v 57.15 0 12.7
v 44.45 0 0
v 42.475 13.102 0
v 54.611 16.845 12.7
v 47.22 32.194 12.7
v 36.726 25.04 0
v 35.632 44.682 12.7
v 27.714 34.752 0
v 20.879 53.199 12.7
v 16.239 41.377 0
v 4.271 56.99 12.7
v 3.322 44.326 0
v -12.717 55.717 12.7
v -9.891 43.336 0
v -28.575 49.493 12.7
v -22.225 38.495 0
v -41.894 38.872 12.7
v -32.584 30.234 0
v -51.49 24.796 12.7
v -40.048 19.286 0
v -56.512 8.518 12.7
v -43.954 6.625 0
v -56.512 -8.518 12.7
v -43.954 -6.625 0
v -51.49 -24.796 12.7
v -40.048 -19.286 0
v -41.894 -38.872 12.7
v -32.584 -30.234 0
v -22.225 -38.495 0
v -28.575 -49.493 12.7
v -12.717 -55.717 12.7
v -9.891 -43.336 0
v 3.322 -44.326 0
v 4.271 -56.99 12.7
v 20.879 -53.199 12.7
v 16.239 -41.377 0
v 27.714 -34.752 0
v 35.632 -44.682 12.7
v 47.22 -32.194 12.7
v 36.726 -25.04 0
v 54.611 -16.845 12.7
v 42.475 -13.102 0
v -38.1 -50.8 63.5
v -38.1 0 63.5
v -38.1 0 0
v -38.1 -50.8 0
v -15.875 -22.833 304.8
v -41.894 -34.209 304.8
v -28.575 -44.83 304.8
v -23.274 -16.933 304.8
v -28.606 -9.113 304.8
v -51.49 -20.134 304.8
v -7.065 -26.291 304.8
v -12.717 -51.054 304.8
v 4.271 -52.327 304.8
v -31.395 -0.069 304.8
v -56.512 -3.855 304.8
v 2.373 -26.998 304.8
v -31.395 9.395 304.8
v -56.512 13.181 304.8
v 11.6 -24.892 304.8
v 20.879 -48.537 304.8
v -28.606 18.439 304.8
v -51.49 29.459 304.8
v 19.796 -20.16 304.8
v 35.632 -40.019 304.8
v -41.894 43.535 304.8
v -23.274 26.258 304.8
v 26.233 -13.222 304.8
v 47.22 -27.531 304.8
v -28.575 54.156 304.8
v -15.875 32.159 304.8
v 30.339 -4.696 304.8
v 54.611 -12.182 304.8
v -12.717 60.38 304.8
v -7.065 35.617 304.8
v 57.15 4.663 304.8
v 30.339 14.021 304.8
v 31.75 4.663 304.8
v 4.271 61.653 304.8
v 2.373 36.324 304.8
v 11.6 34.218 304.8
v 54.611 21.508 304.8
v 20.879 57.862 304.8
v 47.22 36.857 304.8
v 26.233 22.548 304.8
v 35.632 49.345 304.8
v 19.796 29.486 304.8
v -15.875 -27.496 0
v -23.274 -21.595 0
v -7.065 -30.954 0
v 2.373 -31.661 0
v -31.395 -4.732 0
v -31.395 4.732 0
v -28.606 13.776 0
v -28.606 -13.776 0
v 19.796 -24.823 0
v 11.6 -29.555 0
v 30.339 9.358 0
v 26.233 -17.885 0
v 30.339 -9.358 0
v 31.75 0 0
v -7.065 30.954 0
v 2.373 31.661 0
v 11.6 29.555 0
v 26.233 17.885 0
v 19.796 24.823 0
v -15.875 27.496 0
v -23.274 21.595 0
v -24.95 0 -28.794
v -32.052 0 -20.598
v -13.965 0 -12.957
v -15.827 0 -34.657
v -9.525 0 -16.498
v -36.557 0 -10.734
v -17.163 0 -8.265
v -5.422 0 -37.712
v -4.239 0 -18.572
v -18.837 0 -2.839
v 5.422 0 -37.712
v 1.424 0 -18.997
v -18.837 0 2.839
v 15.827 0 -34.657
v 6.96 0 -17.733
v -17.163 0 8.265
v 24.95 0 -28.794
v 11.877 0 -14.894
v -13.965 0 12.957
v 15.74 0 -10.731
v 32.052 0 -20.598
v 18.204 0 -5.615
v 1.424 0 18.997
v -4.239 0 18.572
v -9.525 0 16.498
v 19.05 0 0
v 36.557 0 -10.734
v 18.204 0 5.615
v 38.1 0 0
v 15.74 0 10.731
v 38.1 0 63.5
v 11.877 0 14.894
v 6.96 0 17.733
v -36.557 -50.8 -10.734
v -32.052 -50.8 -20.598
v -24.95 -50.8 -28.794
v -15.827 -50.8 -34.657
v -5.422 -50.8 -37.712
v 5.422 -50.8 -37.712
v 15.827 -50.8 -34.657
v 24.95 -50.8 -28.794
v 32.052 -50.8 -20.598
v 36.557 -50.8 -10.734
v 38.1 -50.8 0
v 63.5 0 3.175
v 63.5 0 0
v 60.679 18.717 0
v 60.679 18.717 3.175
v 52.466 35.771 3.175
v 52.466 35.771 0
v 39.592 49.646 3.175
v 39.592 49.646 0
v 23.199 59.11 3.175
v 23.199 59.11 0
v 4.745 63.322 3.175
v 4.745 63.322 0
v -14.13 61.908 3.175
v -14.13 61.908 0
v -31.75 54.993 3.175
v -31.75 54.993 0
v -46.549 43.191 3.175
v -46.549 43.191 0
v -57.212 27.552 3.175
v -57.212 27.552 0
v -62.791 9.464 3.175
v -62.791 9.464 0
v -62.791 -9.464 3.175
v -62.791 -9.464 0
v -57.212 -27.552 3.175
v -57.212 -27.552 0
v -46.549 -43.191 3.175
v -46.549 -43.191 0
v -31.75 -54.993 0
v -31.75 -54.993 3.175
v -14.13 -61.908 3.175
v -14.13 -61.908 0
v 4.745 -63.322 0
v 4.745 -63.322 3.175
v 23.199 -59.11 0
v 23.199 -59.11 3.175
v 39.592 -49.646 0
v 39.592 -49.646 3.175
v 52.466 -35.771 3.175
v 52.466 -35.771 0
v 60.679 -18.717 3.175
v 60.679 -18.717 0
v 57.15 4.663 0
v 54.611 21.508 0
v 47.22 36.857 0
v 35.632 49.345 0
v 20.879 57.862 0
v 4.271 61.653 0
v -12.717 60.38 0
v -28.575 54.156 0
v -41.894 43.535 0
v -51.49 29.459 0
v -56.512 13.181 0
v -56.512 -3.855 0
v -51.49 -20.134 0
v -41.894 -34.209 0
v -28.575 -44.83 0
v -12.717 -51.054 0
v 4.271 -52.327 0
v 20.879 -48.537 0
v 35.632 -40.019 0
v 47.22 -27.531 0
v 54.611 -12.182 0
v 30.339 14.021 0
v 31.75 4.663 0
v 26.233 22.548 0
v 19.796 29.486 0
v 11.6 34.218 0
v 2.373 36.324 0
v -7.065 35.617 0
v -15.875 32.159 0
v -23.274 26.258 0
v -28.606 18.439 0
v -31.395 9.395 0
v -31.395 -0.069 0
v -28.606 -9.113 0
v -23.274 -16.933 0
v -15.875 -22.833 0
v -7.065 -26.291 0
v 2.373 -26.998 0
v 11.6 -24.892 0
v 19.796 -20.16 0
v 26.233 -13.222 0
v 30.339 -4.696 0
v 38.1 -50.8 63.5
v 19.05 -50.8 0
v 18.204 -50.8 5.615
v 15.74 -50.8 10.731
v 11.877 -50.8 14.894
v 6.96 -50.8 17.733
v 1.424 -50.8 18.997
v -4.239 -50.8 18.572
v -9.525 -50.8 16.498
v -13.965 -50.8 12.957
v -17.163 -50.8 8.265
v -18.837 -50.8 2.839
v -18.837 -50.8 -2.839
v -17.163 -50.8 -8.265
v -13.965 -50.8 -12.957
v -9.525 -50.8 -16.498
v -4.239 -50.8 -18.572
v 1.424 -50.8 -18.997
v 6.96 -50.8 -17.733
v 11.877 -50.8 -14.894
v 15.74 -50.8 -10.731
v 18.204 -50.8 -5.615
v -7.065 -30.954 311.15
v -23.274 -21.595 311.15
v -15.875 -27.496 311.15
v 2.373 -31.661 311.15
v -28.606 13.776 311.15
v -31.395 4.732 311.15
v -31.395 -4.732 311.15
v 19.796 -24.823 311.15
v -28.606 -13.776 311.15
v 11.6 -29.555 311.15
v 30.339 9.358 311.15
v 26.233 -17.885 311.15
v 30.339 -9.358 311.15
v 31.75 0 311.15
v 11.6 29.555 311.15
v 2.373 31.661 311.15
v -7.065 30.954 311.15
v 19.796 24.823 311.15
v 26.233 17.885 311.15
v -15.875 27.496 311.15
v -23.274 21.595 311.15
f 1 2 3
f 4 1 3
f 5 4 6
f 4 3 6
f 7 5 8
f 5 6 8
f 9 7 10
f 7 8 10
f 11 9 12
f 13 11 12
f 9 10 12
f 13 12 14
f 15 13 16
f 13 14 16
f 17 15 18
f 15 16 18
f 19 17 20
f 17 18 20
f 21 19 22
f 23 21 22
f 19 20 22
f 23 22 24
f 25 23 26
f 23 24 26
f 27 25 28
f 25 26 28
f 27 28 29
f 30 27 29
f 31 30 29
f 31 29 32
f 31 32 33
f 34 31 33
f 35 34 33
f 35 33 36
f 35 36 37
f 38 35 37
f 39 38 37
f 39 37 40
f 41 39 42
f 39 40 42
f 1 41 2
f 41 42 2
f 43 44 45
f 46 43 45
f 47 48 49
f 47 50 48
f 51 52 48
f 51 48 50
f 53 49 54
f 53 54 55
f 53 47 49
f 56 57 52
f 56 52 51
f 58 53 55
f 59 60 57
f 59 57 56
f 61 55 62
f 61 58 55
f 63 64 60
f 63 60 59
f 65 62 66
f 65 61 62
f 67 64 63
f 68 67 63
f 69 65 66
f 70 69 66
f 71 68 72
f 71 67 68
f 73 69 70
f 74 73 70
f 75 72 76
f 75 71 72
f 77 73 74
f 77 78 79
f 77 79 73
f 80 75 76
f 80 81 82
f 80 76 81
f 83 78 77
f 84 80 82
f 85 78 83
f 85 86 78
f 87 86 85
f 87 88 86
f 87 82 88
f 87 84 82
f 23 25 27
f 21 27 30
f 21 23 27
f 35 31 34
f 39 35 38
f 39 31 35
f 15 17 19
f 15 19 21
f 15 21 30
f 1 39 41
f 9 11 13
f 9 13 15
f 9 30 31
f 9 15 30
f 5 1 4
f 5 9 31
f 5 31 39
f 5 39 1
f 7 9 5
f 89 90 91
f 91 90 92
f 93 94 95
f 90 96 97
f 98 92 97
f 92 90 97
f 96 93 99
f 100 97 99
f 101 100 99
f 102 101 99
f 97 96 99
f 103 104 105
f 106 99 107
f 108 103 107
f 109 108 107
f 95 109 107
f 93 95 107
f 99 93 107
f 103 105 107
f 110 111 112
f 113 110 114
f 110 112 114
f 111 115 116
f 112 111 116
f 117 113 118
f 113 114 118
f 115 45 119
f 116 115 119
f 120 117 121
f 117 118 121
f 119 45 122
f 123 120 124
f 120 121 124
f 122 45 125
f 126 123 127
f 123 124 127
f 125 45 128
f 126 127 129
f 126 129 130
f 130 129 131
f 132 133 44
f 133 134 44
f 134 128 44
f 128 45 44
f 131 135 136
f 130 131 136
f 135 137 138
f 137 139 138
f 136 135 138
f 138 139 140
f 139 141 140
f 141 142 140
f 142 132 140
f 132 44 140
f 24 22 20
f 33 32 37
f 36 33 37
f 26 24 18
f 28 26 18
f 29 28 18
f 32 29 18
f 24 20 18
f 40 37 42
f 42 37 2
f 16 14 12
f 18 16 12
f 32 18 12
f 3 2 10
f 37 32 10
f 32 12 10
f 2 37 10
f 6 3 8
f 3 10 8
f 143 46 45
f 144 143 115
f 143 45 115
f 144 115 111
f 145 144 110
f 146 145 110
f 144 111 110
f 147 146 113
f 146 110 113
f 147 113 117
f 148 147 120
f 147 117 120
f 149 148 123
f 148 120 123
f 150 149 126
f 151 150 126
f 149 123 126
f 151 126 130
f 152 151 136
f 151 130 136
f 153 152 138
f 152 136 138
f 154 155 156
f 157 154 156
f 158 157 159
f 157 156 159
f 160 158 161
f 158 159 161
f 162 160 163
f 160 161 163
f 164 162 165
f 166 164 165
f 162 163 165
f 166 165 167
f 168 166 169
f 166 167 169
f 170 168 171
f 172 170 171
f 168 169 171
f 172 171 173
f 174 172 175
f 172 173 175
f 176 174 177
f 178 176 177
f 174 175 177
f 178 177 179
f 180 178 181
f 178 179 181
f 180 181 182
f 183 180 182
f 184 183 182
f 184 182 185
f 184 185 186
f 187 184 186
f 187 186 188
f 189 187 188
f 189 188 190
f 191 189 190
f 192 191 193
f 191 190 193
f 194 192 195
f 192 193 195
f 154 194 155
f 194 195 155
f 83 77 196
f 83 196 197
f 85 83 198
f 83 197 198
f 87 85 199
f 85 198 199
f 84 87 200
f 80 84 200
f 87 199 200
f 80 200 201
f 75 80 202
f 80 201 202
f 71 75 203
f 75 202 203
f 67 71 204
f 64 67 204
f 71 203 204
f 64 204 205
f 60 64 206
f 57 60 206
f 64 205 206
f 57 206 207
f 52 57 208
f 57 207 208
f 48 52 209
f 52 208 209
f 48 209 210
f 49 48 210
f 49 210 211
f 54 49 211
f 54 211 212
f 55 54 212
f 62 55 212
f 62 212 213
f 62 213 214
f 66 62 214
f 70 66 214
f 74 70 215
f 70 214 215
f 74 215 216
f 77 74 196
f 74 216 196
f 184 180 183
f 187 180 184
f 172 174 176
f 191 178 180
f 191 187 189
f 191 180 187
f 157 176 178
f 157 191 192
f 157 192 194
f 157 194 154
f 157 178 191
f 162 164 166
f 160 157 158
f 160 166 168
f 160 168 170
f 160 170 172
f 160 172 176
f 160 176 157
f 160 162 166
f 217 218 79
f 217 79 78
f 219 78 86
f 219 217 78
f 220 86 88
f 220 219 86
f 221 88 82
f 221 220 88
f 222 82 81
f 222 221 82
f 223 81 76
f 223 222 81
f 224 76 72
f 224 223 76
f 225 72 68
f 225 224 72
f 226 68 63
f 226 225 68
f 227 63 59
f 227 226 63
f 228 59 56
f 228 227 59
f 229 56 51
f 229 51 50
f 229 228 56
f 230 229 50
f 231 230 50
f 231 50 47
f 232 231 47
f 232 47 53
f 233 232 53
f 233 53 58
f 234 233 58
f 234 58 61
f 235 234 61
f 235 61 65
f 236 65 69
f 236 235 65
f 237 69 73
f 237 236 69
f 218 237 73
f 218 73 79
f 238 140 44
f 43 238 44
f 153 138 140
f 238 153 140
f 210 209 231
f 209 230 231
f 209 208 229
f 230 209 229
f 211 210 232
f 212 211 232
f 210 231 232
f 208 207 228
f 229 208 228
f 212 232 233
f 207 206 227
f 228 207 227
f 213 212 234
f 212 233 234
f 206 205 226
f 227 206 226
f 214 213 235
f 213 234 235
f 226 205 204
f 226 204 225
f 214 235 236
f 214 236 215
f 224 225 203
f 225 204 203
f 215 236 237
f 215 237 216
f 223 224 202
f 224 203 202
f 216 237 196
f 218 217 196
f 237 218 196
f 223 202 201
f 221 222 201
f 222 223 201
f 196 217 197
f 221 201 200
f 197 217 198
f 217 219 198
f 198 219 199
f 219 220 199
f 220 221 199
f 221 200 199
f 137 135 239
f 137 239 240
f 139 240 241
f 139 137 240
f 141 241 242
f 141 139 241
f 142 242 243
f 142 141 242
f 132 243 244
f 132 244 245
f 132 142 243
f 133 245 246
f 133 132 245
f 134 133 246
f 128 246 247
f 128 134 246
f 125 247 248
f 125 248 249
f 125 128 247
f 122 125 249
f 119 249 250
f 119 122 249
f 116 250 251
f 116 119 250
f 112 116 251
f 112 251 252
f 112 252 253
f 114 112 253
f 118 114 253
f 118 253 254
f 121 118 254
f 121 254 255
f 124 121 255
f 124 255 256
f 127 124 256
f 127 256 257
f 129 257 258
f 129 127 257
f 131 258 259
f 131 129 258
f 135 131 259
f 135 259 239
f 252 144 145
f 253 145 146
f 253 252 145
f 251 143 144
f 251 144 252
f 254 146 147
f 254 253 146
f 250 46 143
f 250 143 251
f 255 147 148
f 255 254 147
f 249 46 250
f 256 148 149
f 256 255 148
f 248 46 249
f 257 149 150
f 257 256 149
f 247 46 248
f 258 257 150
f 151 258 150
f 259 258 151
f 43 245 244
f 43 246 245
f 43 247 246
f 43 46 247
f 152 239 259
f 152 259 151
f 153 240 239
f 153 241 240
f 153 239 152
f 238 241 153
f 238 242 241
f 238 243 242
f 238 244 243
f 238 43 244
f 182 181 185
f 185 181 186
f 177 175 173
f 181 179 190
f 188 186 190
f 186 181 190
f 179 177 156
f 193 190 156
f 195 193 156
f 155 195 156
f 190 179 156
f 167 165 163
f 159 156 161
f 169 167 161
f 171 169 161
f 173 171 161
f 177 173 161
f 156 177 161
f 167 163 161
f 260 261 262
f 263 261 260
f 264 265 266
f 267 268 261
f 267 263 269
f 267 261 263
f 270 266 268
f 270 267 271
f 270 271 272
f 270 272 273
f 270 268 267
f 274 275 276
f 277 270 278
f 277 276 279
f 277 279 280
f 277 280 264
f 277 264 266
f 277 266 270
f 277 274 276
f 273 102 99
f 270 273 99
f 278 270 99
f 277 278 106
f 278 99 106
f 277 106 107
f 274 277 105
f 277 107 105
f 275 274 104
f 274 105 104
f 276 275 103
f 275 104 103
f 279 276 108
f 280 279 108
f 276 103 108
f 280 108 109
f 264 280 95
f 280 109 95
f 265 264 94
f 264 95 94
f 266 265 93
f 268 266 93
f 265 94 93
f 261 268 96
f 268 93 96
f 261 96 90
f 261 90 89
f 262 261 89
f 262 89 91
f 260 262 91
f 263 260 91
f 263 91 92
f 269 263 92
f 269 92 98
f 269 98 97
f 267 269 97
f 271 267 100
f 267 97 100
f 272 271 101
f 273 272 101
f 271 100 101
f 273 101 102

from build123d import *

# Parameters (mm, degrees)
F0_R      = 19.05
F1_DEPTH  = 50.8
F2_R      = 57.15
F3_DEPTH  = 12.7
F4_SIZE   = 12.69999
F5_R      = 63.5
F6_DEPTH  = 3.175
F7_R      = 57.15
F7_R_2    = 31.75
F8_DEPTH  = 304.8
F9_R      = 31.75
F10_DEPTH = 311.15
F12_DEPTH = 12.7


# Not quite as in the source:
# - a fillet or chamfer is up to 0.001 mm smaller than in the source, because OpenCascade refuses the exact size


with BuildPart() as f1:
    # F0 (on Front) → F1 (new body)
    with BuildSketch(Plane.XZ):
        with BuildLine():
            ThreePointArc((-38.1, 0), (0, -38.1), (38.1, 0))
            ThreePointArc((38.1, 0), (0, 38.1), (-38.1, 0))
        make_face()
        Circle(F0_R, mode=Mode.SUBTRACT)
        with BuildLine():
            ThreePointArc((-38.1, 0), (0, 38.1), (38.1, 0))
            Line((38.1, 0), (38.1, 63.5))
            Line((38.1, 63.5), (-38.1, 63.5))
            Line((-38.1, 63.5), (-38.1, 0))
        make_face()
    extrude(amount=F1_DEPTH)


with BuildPart() as f3:
    # F2 (on Top) → F3 (new body)
    with BuildSketch(Plane.XY):
        Circle(F2_R)
    extrude(amount=F3_DEPTH)

    # F4 (size 12.7 in the source; OpenCascade refuses exactly that, so slightly less here)
    f4_edges = [f3.edges().sort_by_distance(p)[0] for p in [
        (-57.15, 0, 0),
    ]]
    chamfer(f4_edges, length=F4_SIZE)


with BuildPart() as f6:
    # F5 (on Top) → F6 (new body)
    with BuildSketch(Plane.XY):
        Circle(F5_R)
    extrude(amount=F6_DEPTH)


with BuildPart() as f8:
    # F7 (on Top) → F8 (new body)
    with BuildSketch(Plane.XY):
        with Locations((0, 4.6629247808)):
            Circle(F7_R)
        with Locations((0, 4.6629247808)):
            Circle(F7_R_2, mode=Mode.SUBTRACT)
    extrude(amount=F8_DEPTH)


with BuildPart() as f10:
    # F9 (on Top) → F10 (new body)
    with BuildSketch(Plane.XY):
        Circle(F9_R)
    extrude(amount=F10_DEPTH)


with BuildPart() as f12:
    # F11 (on Front) → F12 (new body)
    with BuildSketch(Plane.XZ):
        with BuildLine():
            Line((171.1853612941, 141.2297336433), (0, 31.75))
            ThreePointArc((0, 31.75), (-30.9973982261, -6.8719577425), (13.4181298103, -28.7752722384))
            Line((13.4181298103, -28.7752722384), (234.95, 0))
            Line((234.95, 0), (171.1853612941, 141.2297336433))
        make_face()
        with BuildLine():
            ThreePointArc((19.05, 0), (-13.4703841816, -13.4703841816), (0, 19.05))
            ThreePointArc((0, 19.05), (13.4703841816, 13.4703841816), (19.05, 0))
        make_face(mode=Mode.SUBTRACT)
    extrude(amount=F12_DEPTH)


solid = Compound([f1.part, f3.part, f6.part, f8.part, f10.part])
